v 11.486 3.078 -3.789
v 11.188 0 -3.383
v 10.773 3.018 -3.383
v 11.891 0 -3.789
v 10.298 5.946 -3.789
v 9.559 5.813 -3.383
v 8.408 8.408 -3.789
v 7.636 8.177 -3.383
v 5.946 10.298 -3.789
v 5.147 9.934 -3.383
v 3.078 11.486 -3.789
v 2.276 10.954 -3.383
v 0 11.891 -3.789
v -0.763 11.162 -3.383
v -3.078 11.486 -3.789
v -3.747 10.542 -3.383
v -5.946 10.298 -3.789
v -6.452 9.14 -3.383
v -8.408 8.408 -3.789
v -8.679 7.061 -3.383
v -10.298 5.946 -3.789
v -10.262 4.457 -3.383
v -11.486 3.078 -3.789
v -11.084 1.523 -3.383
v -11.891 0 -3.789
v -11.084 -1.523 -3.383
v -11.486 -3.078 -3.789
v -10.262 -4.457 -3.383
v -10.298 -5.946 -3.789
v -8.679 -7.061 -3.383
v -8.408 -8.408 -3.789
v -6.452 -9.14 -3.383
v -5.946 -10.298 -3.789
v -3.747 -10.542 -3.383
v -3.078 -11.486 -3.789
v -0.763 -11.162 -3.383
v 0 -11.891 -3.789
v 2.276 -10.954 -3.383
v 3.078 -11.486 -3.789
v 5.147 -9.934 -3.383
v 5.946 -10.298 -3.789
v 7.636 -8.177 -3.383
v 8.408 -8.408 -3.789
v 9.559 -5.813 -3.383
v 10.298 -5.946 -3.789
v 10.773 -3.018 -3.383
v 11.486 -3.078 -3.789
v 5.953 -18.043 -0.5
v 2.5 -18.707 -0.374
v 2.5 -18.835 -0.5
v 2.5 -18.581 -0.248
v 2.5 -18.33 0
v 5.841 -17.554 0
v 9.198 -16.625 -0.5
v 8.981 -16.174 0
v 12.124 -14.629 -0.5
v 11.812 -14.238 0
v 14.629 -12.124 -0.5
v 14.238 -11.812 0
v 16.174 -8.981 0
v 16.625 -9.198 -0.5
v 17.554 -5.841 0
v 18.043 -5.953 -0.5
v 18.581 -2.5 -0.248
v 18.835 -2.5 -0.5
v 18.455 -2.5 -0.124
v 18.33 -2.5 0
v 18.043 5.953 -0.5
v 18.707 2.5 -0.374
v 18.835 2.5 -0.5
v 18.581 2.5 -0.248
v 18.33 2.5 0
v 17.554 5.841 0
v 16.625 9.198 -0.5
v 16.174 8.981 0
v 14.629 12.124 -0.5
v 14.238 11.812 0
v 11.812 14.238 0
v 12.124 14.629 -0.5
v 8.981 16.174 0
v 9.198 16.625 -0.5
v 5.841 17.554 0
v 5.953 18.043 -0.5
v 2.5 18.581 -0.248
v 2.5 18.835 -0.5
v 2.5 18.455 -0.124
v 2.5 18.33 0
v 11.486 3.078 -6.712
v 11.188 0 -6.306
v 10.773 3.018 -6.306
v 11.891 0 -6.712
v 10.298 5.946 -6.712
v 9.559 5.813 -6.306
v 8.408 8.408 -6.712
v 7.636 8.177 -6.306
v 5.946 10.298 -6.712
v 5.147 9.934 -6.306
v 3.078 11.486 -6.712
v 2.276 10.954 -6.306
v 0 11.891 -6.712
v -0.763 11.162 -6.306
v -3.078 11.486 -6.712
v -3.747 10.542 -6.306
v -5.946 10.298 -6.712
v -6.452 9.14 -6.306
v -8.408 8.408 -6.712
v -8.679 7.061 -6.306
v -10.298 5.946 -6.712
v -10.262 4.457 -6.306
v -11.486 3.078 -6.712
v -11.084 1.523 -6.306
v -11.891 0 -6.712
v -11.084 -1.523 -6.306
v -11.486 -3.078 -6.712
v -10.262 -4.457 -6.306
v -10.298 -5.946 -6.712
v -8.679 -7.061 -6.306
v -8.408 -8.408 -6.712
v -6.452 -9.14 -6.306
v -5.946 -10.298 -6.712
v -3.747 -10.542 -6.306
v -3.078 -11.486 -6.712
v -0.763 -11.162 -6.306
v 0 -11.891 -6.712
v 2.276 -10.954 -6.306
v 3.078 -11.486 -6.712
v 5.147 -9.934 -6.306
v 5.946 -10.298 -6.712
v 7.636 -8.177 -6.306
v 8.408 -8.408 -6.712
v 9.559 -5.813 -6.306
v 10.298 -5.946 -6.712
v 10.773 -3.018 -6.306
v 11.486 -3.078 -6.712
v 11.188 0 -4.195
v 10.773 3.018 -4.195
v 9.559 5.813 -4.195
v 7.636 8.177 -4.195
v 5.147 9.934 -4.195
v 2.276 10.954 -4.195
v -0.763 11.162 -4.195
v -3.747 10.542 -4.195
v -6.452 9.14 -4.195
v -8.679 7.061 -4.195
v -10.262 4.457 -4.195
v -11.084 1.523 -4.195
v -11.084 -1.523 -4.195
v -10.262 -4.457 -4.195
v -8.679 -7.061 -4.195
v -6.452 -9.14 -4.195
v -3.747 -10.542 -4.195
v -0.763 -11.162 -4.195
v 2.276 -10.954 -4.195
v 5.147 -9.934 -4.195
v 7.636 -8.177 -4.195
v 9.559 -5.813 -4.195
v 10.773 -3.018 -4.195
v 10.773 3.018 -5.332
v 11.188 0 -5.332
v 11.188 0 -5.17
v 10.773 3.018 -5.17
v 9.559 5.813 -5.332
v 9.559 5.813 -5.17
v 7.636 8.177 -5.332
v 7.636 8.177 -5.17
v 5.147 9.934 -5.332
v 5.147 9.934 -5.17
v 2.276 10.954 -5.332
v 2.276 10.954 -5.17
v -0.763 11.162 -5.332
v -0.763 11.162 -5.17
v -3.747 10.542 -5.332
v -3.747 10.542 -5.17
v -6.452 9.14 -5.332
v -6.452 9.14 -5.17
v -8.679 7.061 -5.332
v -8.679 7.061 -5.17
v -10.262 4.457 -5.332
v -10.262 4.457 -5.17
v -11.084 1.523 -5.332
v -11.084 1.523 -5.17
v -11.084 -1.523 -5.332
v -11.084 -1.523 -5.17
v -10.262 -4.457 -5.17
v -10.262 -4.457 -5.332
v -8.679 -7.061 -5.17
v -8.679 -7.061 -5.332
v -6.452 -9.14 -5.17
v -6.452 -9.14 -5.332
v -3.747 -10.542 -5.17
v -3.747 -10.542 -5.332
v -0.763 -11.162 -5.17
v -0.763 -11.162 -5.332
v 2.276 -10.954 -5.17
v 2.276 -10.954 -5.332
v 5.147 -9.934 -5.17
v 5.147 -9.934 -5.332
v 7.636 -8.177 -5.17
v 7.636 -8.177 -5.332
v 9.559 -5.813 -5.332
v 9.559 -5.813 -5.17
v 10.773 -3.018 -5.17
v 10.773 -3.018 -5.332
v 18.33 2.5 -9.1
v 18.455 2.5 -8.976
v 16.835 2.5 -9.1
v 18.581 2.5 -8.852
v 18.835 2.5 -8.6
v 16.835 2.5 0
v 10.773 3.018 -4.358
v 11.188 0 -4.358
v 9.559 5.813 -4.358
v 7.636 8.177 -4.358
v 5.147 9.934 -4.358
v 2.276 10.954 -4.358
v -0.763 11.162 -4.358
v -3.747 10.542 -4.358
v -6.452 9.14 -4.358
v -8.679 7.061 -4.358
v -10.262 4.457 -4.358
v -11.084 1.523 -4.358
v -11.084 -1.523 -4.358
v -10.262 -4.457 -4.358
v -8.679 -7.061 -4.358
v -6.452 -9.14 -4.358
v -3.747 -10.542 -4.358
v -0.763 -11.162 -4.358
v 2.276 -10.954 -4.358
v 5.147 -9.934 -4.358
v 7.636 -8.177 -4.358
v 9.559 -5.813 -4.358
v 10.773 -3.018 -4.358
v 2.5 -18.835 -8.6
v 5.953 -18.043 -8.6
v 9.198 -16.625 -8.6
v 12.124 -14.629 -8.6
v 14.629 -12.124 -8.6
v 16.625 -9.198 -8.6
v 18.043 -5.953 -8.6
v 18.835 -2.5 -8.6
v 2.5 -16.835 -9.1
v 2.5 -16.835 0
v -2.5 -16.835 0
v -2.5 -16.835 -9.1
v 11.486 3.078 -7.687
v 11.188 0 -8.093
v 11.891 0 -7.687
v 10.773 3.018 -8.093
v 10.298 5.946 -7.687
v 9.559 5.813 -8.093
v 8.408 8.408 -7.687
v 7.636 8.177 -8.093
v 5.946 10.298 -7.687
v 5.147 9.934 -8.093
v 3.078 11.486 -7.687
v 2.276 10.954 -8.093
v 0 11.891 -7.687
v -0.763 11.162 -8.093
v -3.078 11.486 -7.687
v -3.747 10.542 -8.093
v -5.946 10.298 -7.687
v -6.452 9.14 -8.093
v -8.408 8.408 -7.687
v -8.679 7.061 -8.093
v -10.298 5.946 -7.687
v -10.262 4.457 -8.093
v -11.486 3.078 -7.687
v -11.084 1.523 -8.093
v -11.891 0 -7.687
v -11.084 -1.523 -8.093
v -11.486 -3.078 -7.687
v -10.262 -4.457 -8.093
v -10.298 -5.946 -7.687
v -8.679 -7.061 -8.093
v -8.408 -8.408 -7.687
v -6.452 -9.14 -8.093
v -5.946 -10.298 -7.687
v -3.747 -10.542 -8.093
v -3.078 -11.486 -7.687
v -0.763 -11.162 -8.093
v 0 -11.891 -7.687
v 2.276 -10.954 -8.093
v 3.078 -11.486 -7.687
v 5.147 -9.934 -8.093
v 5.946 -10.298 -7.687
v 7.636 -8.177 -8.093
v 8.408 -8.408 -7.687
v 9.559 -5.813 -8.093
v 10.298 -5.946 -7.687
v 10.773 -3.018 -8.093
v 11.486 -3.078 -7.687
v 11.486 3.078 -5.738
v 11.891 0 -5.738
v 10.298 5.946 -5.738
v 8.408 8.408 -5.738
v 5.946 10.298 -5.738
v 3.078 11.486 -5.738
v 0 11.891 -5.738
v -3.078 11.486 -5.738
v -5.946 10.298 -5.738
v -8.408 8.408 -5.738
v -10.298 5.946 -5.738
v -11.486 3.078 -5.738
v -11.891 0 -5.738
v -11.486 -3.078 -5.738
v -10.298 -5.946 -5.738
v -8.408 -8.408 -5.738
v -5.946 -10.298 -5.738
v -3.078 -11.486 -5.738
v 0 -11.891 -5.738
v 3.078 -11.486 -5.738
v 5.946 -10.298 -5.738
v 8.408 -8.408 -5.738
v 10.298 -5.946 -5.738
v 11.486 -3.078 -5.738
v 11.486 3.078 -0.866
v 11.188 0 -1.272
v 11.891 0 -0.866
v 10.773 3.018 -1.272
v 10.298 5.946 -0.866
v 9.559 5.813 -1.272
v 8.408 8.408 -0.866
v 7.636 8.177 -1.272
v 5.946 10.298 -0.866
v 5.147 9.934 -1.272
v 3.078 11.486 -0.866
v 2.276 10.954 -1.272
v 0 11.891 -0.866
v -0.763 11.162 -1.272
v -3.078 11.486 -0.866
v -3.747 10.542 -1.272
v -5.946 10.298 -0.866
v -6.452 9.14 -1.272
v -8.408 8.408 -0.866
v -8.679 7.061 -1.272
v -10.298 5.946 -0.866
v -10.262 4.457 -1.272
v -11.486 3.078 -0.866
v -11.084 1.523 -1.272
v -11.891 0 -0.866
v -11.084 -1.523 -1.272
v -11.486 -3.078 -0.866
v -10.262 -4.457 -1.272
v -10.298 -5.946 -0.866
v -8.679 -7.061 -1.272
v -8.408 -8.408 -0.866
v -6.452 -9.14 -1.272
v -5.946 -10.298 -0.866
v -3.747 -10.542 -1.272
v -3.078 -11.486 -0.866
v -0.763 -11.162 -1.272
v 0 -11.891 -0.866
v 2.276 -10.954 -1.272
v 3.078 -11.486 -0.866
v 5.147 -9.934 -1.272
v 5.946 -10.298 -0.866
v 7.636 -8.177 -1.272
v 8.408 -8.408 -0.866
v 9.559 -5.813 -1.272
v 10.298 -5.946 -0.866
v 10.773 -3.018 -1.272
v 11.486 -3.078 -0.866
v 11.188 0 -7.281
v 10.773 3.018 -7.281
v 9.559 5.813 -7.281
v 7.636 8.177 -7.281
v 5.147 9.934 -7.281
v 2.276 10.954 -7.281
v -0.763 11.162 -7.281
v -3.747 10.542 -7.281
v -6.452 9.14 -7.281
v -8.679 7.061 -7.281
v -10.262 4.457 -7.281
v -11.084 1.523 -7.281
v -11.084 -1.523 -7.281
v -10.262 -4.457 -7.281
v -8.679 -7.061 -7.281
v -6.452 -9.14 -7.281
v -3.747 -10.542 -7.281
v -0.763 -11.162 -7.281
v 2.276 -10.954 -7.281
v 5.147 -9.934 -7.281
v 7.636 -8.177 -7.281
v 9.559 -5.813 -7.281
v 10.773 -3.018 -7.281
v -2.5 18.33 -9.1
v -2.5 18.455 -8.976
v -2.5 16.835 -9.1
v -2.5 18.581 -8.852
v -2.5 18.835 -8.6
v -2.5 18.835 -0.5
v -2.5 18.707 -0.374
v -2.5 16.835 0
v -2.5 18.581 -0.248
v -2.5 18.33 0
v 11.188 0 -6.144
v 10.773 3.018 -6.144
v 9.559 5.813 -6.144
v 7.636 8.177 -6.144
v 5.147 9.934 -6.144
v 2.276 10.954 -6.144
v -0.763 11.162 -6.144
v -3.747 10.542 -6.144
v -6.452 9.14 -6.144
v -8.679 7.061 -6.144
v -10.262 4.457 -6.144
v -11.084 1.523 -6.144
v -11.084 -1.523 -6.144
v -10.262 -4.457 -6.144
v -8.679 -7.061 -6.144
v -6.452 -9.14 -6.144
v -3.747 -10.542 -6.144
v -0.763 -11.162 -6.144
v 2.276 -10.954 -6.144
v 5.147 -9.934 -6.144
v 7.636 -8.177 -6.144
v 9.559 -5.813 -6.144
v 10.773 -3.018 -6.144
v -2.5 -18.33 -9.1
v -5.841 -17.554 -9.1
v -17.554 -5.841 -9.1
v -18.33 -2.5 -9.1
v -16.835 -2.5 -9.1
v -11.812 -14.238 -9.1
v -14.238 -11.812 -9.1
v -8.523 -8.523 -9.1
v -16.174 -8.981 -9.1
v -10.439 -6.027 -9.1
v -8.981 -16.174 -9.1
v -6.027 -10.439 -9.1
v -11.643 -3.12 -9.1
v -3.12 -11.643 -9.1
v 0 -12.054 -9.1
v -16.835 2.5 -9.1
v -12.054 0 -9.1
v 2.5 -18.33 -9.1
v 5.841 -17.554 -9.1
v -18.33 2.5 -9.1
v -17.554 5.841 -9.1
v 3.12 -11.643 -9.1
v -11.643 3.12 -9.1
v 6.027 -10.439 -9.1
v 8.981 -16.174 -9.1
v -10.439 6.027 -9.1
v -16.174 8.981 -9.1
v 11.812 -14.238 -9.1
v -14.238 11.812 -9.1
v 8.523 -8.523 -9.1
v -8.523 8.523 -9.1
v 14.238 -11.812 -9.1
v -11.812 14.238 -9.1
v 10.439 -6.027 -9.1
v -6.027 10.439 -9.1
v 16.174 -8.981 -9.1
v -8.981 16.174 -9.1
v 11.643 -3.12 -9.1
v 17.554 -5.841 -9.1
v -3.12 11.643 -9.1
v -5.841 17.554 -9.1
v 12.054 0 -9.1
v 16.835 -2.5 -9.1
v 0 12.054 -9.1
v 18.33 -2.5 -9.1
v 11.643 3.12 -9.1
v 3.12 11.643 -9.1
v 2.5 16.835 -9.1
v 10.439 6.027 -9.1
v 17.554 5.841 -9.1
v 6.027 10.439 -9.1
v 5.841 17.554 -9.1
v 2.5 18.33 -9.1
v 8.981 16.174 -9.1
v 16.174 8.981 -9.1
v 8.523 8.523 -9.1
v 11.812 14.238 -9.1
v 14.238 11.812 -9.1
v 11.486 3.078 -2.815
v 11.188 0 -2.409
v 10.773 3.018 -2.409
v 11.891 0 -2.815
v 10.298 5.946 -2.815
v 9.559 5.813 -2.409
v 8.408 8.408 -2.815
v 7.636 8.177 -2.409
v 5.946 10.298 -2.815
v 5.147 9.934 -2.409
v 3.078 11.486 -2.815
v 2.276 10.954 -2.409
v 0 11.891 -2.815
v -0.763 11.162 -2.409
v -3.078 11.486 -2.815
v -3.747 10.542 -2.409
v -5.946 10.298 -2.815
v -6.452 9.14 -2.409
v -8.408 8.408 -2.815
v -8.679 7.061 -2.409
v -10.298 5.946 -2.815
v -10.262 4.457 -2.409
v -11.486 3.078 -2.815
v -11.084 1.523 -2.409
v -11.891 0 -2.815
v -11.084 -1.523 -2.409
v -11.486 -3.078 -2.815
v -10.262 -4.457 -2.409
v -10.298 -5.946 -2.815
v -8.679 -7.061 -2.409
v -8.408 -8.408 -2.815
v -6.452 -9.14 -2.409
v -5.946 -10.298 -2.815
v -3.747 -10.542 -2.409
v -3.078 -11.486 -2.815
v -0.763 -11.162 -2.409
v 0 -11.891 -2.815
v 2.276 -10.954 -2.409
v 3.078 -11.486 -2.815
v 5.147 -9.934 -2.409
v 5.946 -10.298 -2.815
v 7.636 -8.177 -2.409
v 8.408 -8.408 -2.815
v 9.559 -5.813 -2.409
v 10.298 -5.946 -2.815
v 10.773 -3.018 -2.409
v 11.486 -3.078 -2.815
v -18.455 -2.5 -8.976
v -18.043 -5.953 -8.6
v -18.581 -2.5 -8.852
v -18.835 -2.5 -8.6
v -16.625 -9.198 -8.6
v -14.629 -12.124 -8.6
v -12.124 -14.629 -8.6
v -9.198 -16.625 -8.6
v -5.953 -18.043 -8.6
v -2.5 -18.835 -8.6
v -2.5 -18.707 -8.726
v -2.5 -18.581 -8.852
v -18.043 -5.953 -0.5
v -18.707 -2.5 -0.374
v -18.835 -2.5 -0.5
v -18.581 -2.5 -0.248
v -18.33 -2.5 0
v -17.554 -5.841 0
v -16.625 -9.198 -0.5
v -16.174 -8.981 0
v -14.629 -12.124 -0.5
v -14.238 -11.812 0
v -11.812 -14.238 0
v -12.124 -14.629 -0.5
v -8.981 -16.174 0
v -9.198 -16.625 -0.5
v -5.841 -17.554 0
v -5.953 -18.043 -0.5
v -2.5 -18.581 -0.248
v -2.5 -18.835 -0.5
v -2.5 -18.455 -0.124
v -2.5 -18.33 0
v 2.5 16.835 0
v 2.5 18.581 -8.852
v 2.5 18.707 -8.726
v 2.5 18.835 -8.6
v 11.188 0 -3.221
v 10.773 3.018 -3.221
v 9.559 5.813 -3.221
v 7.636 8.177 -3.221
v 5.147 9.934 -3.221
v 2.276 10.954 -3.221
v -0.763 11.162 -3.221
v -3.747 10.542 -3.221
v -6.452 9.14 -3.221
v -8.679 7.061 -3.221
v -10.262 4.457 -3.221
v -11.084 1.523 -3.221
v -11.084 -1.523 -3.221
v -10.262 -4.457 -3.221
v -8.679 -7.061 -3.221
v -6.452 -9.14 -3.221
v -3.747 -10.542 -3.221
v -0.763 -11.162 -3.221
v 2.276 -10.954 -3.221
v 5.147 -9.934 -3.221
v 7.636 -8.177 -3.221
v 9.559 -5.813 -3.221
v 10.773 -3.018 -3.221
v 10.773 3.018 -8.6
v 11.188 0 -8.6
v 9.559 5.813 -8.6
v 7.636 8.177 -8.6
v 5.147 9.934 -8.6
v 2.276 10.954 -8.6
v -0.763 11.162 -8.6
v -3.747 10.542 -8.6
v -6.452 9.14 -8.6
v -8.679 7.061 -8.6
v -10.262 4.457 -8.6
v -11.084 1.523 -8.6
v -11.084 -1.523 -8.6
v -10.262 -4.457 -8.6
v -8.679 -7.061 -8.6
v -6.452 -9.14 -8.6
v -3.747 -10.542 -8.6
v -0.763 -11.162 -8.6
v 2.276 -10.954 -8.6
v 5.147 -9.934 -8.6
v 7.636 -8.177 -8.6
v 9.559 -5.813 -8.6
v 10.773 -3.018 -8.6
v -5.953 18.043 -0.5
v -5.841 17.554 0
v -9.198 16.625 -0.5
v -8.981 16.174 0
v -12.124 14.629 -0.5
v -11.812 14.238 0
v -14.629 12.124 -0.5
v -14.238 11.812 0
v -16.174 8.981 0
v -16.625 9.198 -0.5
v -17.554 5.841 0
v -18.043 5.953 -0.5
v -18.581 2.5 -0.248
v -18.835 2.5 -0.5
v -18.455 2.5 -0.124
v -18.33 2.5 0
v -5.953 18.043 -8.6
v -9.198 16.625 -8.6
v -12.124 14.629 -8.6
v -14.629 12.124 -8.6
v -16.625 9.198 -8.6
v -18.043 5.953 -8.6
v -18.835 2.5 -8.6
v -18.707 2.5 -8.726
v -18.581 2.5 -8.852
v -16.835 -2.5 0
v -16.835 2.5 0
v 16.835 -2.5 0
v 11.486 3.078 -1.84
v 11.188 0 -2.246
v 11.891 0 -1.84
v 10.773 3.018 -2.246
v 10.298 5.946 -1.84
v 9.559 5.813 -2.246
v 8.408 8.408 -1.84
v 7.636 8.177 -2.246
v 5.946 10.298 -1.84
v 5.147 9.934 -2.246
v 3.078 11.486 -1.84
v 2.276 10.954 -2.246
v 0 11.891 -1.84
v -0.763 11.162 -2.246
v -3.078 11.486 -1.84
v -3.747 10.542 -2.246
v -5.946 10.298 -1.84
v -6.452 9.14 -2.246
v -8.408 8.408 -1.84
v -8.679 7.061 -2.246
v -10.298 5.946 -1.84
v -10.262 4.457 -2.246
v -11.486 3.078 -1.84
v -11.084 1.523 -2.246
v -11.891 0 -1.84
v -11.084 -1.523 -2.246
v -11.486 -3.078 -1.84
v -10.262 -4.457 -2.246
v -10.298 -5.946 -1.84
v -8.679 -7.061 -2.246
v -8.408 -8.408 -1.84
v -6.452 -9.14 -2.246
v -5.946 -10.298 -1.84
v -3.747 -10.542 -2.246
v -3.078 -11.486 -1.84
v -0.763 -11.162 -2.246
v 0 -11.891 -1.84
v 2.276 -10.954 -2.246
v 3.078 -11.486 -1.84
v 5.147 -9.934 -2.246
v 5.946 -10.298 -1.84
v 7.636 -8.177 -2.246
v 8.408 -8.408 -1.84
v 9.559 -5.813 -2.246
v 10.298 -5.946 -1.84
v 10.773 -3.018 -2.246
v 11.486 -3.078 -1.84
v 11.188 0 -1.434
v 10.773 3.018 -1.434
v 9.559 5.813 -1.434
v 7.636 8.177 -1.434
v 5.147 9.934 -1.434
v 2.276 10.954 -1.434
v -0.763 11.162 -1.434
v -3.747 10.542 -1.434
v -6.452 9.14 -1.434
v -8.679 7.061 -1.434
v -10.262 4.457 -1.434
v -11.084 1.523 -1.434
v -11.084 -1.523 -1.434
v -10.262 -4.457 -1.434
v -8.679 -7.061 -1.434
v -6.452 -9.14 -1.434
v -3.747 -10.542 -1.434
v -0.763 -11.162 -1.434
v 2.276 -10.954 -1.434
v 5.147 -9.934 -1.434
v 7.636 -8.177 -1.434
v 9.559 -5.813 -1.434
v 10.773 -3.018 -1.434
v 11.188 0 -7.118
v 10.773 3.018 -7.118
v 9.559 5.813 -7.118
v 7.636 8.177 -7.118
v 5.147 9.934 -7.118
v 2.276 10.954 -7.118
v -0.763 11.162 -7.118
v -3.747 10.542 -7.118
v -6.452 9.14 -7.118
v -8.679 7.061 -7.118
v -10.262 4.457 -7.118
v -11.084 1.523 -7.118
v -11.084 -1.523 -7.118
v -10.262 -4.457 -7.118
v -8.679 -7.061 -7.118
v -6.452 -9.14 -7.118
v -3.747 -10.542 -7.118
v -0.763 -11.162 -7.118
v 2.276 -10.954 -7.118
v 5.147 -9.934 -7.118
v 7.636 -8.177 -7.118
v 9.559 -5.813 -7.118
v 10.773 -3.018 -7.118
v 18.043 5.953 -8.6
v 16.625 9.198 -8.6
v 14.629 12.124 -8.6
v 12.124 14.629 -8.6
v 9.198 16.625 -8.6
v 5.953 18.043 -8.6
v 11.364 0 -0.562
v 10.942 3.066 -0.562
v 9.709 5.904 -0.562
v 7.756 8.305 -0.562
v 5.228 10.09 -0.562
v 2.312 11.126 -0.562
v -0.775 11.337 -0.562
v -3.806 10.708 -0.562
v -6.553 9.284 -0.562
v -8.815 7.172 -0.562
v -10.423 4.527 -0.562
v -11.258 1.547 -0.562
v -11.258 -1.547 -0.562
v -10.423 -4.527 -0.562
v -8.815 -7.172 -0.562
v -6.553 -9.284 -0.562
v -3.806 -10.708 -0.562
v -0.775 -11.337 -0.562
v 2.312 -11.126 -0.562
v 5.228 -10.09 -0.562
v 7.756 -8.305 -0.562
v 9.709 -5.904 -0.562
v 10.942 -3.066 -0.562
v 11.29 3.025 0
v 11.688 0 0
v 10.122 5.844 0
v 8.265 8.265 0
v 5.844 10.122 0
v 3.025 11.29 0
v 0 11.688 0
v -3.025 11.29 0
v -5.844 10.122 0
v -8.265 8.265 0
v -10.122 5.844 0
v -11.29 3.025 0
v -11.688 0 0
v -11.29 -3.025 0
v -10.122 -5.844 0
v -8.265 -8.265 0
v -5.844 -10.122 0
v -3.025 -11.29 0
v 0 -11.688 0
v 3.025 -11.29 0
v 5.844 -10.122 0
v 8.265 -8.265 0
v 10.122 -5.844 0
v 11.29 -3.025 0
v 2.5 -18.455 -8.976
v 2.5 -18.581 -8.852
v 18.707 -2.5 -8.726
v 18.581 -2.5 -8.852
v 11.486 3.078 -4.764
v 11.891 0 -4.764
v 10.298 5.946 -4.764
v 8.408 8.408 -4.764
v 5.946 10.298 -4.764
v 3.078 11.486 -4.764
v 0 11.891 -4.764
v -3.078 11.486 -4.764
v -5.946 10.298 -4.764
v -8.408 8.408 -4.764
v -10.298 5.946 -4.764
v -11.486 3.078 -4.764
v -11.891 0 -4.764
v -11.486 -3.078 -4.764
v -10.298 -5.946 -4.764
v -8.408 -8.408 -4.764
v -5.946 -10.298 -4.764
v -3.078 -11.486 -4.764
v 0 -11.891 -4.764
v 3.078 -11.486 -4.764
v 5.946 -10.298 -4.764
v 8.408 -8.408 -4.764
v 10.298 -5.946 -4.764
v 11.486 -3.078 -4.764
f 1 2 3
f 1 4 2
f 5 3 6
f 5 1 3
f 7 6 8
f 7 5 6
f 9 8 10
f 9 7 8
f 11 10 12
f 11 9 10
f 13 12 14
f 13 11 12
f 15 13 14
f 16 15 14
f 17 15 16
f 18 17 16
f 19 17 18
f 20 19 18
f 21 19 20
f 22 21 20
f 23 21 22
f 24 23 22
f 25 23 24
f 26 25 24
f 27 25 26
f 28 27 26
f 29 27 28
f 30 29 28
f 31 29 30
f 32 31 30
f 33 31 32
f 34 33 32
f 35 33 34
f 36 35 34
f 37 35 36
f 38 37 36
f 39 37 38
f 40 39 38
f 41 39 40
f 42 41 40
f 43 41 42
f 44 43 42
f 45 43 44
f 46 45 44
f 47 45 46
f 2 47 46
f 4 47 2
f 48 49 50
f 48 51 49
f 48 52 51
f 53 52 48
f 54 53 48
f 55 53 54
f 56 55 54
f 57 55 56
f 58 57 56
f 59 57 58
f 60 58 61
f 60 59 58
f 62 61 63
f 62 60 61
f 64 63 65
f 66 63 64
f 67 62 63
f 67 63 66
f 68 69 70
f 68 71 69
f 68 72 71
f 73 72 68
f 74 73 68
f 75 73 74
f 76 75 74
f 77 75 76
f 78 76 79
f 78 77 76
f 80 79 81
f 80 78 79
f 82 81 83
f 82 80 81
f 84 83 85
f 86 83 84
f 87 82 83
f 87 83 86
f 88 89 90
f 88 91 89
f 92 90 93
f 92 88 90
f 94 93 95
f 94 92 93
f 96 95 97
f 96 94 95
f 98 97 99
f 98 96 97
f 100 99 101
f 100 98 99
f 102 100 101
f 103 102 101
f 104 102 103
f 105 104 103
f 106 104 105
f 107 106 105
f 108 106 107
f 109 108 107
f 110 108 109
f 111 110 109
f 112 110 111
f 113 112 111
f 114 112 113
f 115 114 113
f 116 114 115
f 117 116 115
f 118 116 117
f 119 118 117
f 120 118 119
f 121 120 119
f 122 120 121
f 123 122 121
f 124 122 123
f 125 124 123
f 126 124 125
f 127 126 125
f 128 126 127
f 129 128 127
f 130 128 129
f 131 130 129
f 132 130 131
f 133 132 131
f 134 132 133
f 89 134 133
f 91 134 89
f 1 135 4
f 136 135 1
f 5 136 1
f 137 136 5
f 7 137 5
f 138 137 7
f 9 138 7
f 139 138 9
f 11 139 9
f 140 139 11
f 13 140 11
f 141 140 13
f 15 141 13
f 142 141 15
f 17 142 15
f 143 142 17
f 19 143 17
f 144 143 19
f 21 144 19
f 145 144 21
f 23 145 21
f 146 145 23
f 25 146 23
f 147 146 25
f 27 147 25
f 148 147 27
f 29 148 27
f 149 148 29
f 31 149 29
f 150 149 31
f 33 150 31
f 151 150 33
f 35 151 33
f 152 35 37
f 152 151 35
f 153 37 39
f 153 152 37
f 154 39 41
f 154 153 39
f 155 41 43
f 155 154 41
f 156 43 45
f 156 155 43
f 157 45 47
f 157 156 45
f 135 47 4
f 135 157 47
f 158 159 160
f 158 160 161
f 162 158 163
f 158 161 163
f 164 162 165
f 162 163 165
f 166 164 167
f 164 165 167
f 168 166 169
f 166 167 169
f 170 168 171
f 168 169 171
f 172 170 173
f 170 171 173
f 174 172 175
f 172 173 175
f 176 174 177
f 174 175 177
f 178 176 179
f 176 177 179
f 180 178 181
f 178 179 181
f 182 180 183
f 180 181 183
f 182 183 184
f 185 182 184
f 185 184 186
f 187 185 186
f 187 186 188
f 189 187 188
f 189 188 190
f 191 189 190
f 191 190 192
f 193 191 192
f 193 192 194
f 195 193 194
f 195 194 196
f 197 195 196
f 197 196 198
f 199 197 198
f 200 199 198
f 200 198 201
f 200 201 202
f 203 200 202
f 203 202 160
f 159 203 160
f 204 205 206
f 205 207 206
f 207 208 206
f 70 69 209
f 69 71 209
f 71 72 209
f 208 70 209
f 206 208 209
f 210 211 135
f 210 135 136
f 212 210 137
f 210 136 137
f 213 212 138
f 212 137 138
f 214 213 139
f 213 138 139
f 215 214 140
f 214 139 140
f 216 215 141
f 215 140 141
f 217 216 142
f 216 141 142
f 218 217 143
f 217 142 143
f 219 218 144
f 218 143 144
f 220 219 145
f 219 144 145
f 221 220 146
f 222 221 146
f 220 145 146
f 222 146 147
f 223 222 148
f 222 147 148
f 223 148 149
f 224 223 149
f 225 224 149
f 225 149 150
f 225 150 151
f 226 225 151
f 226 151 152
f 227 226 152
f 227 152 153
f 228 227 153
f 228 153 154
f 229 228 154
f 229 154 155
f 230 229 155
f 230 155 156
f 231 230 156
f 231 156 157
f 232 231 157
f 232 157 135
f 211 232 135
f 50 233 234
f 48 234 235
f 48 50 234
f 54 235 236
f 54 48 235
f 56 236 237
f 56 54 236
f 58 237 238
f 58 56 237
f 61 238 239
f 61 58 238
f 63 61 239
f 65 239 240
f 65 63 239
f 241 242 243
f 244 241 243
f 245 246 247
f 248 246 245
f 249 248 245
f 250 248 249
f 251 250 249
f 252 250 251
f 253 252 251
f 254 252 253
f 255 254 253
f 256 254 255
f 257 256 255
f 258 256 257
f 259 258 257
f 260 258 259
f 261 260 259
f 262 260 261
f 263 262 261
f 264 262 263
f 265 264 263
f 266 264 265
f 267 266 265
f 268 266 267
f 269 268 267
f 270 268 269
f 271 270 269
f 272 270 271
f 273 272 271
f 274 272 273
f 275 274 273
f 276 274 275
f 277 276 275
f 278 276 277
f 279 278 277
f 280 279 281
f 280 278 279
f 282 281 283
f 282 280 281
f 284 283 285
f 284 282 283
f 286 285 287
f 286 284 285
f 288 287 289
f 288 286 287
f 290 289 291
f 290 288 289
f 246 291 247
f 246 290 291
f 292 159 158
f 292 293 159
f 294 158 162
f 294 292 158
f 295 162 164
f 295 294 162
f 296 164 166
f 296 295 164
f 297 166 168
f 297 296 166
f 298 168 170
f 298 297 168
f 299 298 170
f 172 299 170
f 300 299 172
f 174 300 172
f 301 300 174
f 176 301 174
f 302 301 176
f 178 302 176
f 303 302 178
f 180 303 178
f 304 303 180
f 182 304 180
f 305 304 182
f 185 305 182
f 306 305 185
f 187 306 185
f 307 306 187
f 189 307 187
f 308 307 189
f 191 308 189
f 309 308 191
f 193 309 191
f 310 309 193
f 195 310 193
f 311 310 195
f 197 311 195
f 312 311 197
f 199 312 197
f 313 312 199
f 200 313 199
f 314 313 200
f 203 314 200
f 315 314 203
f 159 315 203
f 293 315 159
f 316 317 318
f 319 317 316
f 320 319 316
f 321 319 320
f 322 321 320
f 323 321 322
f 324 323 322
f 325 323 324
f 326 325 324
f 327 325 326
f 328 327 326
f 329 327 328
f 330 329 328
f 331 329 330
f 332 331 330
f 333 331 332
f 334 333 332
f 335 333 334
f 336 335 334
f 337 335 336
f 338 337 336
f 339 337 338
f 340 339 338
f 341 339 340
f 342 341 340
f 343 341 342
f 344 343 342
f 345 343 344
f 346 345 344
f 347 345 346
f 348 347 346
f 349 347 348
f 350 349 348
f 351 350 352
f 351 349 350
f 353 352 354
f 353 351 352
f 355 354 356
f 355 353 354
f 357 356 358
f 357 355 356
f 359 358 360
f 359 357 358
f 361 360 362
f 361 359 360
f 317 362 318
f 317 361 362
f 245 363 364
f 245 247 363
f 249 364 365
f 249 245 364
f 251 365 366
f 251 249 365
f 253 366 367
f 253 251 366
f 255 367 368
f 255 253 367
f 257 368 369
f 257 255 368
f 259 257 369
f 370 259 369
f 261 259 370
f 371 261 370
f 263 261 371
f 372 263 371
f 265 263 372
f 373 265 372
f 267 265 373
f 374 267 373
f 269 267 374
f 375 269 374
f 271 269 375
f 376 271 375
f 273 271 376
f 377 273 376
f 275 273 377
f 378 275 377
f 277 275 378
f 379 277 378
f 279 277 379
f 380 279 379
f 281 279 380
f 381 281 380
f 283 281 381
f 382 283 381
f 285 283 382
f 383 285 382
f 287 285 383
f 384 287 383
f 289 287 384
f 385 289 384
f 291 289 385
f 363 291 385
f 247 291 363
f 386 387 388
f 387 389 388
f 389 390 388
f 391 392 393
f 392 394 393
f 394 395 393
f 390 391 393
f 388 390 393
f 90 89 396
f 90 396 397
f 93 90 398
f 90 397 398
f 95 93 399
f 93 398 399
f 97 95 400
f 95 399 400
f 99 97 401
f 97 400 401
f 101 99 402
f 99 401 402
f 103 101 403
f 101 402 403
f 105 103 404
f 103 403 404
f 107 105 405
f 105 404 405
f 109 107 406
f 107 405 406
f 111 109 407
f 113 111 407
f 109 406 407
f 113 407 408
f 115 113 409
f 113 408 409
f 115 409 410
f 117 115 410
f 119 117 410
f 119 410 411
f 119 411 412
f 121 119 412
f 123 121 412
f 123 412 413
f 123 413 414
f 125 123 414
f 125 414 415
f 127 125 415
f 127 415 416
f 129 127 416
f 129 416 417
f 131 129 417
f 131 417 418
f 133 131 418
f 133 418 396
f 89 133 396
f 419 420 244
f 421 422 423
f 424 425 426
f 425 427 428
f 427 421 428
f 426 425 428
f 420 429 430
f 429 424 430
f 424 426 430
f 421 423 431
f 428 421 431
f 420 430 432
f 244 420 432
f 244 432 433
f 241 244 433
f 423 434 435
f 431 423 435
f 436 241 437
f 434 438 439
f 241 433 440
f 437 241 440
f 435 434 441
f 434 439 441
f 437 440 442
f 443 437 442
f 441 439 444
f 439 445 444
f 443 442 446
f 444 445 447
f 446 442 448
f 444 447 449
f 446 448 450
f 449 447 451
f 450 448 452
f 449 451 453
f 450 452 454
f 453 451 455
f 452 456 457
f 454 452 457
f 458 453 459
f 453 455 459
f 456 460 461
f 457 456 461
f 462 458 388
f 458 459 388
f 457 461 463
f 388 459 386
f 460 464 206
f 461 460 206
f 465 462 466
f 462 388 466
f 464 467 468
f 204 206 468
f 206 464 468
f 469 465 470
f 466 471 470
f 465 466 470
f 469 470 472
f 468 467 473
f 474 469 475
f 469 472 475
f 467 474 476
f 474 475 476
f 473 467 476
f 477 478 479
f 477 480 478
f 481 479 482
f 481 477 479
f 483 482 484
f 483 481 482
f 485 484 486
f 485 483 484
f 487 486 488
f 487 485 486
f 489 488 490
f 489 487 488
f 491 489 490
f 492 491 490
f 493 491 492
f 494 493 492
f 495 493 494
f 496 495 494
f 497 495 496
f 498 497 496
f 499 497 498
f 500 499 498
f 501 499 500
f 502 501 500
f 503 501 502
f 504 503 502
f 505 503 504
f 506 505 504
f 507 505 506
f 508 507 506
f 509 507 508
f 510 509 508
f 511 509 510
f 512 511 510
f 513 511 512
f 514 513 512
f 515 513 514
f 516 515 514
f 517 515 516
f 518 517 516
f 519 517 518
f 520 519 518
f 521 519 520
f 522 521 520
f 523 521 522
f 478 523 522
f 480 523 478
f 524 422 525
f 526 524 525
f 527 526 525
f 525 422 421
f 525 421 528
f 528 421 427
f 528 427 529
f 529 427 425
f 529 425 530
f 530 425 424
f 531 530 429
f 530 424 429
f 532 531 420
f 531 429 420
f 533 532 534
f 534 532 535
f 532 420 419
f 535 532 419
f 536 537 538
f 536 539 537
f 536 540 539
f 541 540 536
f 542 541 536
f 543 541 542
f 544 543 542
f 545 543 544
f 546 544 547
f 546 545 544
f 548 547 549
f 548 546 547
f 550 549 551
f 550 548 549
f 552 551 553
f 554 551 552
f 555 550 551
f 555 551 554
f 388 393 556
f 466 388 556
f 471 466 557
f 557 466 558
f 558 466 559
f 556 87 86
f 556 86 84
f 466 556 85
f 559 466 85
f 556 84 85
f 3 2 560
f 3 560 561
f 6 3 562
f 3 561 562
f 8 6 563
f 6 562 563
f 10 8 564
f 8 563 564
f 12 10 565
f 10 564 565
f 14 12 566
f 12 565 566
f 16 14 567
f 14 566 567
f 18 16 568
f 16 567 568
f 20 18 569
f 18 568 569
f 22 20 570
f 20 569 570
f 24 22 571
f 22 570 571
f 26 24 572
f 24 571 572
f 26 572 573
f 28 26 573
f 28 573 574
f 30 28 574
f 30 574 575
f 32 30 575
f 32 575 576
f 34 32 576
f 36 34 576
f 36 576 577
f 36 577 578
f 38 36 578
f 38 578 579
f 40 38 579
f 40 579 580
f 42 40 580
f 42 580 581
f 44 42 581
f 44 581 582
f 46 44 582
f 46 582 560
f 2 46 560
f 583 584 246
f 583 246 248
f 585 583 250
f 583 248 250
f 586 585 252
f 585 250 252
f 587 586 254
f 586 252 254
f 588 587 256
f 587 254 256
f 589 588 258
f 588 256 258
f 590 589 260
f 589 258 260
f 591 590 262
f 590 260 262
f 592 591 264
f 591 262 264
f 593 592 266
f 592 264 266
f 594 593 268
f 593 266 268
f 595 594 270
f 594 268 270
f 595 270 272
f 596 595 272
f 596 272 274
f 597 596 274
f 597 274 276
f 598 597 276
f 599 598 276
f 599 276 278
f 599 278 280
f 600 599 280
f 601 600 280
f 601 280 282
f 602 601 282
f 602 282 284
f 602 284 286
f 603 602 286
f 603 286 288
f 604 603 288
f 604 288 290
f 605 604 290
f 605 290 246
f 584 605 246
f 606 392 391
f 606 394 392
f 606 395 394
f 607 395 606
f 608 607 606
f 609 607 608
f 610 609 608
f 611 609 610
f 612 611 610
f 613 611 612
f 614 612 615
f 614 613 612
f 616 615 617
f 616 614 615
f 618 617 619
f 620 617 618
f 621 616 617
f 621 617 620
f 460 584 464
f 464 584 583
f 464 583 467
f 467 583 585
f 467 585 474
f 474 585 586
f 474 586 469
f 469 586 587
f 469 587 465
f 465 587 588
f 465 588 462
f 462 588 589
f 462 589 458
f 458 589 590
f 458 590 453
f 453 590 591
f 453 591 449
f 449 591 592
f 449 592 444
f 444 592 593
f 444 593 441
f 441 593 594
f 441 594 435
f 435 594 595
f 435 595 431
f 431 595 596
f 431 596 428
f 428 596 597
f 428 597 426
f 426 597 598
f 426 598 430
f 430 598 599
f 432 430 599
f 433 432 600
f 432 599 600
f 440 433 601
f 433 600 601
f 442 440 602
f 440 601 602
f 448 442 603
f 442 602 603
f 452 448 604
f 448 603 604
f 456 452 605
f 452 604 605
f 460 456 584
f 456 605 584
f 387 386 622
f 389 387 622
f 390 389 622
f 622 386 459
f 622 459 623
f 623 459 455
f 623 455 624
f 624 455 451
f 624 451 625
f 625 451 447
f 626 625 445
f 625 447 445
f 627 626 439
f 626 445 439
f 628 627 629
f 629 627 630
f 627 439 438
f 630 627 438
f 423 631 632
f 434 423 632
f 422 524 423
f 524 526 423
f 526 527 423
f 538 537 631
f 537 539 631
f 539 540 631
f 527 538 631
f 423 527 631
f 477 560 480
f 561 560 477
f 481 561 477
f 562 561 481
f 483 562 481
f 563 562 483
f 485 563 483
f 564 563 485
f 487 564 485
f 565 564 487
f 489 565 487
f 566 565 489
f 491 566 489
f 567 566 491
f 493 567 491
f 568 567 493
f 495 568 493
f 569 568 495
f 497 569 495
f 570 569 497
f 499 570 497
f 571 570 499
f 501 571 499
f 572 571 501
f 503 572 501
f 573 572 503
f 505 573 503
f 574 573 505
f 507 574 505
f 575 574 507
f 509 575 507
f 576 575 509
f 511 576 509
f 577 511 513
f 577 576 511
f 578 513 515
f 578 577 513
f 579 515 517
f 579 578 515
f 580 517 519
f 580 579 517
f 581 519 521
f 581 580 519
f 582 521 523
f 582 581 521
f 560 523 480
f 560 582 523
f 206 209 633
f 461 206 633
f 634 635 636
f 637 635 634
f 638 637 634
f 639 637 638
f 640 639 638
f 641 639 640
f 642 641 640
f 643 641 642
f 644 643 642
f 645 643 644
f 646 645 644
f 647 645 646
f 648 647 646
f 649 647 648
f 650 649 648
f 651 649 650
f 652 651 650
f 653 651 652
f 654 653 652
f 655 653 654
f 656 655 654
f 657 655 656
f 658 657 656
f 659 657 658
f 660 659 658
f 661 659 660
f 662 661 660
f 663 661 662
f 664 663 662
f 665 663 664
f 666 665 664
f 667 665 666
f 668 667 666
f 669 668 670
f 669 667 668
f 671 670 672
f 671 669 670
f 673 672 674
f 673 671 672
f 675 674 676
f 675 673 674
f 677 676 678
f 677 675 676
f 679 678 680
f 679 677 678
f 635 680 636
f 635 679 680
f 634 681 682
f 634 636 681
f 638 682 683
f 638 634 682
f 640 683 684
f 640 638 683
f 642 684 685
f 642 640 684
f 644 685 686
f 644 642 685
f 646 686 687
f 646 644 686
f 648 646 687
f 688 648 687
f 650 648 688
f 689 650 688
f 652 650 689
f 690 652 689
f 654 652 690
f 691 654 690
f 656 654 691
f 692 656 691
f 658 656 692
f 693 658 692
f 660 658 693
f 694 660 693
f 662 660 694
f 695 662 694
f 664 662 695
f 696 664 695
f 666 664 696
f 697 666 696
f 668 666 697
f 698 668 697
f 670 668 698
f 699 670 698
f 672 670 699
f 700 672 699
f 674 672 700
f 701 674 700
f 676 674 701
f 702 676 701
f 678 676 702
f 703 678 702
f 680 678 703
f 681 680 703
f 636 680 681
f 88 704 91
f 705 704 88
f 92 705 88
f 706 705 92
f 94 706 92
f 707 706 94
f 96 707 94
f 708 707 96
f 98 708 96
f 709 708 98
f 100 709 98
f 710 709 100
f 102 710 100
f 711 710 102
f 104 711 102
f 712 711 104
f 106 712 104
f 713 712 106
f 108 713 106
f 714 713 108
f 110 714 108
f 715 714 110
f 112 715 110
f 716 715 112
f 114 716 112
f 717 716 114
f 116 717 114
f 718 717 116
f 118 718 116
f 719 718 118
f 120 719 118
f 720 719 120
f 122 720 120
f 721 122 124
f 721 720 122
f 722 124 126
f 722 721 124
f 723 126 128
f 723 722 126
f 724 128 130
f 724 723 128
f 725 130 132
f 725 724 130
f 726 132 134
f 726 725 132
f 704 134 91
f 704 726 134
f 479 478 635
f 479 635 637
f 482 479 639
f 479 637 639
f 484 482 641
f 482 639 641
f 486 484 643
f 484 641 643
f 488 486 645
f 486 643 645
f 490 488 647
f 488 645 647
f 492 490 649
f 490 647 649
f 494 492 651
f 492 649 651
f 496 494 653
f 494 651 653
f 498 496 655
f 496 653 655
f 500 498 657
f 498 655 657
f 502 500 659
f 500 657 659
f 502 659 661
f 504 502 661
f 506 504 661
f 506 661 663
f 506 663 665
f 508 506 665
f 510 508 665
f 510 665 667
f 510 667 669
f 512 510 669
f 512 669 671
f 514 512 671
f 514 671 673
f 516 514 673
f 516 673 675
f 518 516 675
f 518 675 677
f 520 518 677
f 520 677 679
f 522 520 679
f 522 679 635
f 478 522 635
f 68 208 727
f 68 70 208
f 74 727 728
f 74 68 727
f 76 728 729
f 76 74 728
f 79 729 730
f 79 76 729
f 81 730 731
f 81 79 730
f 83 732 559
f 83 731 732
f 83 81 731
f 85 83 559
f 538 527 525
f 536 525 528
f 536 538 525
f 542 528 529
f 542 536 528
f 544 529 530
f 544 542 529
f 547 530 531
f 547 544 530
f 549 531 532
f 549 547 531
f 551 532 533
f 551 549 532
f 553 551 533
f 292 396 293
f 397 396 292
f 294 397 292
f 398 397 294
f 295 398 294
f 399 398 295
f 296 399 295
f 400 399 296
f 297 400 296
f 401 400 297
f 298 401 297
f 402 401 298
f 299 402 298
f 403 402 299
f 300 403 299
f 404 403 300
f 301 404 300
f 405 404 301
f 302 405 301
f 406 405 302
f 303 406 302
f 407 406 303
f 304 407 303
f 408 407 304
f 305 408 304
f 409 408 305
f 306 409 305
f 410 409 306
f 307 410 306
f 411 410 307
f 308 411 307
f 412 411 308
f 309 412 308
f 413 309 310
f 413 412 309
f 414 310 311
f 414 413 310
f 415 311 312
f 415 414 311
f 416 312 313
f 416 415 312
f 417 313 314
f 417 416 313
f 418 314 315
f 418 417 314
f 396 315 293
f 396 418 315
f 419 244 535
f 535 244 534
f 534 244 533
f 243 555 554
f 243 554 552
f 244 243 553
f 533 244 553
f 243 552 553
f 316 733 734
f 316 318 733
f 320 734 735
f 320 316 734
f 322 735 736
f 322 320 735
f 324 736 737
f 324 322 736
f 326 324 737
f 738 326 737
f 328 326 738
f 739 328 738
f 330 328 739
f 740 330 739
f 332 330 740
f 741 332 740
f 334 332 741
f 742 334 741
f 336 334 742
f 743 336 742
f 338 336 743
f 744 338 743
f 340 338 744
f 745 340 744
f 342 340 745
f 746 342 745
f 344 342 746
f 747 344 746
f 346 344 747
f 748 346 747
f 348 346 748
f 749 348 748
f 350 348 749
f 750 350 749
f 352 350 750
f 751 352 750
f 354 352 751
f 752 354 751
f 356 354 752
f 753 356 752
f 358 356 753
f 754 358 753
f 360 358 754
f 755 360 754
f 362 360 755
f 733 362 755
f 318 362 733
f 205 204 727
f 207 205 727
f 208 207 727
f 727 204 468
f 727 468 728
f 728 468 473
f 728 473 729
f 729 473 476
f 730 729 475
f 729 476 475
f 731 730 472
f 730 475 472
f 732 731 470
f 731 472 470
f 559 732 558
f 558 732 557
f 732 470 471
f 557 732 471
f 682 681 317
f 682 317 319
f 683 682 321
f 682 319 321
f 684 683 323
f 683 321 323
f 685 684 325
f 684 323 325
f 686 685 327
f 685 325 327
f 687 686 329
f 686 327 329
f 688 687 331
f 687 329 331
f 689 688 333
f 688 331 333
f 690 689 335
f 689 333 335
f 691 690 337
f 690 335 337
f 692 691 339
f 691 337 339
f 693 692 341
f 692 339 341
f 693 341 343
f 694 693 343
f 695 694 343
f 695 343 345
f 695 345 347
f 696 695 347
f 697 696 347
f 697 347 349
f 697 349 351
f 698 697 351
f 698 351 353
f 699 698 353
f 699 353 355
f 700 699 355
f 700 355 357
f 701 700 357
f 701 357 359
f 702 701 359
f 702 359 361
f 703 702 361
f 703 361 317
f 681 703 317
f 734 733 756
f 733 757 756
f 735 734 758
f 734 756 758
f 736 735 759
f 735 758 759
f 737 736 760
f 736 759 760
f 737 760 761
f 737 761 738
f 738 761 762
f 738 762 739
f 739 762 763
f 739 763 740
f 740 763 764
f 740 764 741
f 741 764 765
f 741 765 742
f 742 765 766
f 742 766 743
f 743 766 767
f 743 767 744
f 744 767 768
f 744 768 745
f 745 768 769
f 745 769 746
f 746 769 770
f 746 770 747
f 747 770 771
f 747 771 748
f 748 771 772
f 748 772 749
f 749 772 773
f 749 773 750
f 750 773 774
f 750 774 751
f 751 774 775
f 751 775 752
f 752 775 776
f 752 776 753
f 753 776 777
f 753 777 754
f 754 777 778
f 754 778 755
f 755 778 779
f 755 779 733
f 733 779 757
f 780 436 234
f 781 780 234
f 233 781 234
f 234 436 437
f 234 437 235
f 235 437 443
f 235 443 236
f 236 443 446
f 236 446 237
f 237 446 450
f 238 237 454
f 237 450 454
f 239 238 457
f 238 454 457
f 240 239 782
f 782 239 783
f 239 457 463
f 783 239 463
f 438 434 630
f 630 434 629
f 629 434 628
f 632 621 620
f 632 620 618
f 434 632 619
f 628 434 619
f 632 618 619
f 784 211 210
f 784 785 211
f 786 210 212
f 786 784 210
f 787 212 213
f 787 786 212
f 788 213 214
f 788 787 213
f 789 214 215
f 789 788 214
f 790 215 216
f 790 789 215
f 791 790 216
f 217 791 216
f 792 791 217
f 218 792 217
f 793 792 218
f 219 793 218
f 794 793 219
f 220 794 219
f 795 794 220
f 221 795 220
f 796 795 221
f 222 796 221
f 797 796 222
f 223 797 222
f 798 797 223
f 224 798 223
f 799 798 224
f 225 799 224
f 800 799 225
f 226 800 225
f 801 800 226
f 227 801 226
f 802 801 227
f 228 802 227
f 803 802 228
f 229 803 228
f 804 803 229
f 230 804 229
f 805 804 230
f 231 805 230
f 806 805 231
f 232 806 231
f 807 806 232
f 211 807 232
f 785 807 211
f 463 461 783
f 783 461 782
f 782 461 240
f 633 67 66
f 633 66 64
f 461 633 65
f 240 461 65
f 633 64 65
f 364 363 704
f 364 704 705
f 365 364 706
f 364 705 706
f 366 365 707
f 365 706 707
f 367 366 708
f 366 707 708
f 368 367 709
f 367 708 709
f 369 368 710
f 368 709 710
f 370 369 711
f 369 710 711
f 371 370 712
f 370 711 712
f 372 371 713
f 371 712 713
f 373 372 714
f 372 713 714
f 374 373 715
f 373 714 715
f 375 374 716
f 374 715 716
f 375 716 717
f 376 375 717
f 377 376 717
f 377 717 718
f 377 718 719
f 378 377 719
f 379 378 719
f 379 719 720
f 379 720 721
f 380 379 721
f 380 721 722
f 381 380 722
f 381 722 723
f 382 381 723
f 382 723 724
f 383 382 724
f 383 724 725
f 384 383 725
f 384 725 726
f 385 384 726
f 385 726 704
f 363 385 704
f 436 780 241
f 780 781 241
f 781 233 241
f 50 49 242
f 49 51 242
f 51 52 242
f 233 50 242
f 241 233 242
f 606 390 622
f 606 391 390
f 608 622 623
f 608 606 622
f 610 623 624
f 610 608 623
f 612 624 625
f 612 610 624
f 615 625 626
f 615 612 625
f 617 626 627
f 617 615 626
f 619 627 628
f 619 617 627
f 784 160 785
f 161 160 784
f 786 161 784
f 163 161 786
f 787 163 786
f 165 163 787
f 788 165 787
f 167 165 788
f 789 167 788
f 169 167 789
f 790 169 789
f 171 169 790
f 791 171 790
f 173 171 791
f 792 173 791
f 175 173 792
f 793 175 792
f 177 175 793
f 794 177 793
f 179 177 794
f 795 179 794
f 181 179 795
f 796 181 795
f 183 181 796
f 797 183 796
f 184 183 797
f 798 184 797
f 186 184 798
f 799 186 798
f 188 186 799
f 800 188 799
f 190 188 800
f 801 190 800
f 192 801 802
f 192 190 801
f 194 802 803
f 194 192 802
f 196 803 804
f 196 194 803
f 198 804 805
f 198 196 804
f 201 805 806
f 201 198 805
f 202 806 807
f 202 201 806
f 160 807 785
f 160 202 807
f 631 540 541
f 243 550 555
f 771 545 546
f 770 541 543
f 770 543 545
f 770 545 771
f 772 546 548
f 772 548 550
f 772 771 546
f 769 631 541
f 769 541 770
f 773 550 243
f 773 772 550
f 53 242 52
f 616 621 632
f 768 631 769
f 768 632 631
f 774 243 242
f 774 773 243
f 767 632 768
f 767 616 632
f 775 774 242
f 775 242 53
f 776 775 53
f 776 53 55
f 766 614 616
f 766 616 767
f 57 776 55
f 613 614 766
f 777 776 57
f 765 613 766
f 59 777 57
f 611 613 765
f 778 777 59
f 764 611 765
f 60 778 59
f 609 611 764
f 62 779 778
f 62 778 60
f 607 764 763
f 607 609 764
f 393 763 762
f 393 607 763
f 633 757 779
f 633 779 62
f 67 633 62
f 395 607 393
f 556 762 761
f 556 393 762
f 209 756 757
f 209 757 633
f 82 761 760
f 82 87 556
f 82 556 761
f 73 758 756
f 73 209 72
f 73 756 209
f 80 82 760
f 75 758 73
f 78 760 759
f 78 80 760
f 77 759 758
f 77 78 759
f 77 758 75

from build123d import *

# Parameters (mm, degrees)
SKETCH2_R               = 19
BASENUT_DEPTH           = 9.1
CHAMFER1_SIZE           = 0.5
SKETCH3_R               = 11.188
HOLE_DEPTH              = 10.1
ENDCHAMFER_SIZE2        = 0.5
ENDCHAMFER_SIZE         = 0.866025404
ENDCHAMFER_EDGE_2_SIZE2 = 0.5
ENDCHAMFER_EDGE_2_SIZE  = 0.866025404
SLOTCUT_DEPTH           = 10.1
SLOTPAT_COUNT           = 4
LPATTERN10_COUNT        = 8
LPATTERN10_PITCH        = 0.9744


with BuildPart() as part:
    # Sketch2 → BaseNut (new body)
    with BuildSketch(Plane.XY):
        Circle(SKETCH2_R)
    extrude(amount=-BASENUT_DEPTH)

    # Chamfer1
    chamfer1_edges = [part.edges().sort_by_distance(p)[0] for p in [
        (-19, 0, 0),
        (-19, 0, -9.1),
    ]]
    chamfer(chamfer1_edges, length=CHAMFER1_SIZE)

    # Sketch3 → Hole (cut, through all)
    with BuildSketch(Plane(origin=(-17.561722019, 31.682666601, 0), x_dir=(1, 0, 0), z_dir=(0, 0, 1))):
        with Locations((17.561722019, -31.682666601)):
            Circle(SKETCH3_R)
    extrude(amount=-HOLE_DEPTH, mode=Mode.SUBTRACT)

    # EndChamfer
    endchamfer_edges = [part.edges().sort_by_distance(p)[0] for p in [
        (-11.188, 0, -9.1),
    ]]
    chamfer(endchamfer_edges, length=ENDCHAMFER_SIZE, length2=ENDCHAMFER_SIZE2)

    # EndChamfer edge 2
    endchamfer_edge_2_edges = [part.edges().sort_by_distance(p)[0] for p in [
        (-11.188, 0, 0),
    ]]
    chamfer(endchamfer_edge_2_edges, length=ENDCHAMFER_EDGE_2_SIZE, length2=ENDCHAMFER_EDGE_2_SIZE2)

    # Sketch4 → SlotCut (cut, through all)
    with BuildSketch(Plane(origin=(-28.84840977, 49.266341409, 0), x_dir=(1, 0, 0), z_dir=(0, 0, 1))):
        with BuildLine():
            Line((26.34840977, -30.431533207), (26.34840977, -32.431533207))
            Line((26.34840977, -32.431533207), (31.34840977, -32.431533207))
            Line((31.34840977, -32.431533207), (31.34840977, -30.431533207))
            ThreePointArc((31.34840977, -30.431533207), (28.84840977, -30.266341409), (26.34840977, -30.431533207))
        make_face()
    slotcut = extrude(amount=-SLOTCUT_DEPTH, mode=Mode.SUBTRACT)

    # SlotPat: SlotCut ×4 about axis
    slotpat_axis = Axis((0, 0, 0), (0, 0, 1))
    for i in range(1, SLOTPAT_COUNT):
        add(slotcut.rotate(slotpat_axis, i * 360 / SLOTPAT_COUNT), mode=Mode.SUBTRACT)

    # Sketch5 → Cut-Revolve10 (revolve, cut)
    with BuildSketch(Plane(origin=(0, 0, 0), x_dir=(1, 0, 0), z_dir=(0, 1, 0))):
        Polygon((10.376, 1.272025404), (10.376, 0.460025404), (11.188, 0.460025404), (11.891212628, 0.866025404), (11.188, 1.272025404), align=None)
    cut_revolve10 = revolve(axis=Axis((0, 0, -37.301805437), (0, 0, 1)), mode=Mode.SUBTRACT)

    # LPattern10: Cut-Revolve10 ×8
    with Locations(*[(0, 0, -i * LPATTERN10_PITCH) for i in range(1, LPATTERN10_COUNT)]):
        add(cut_revolve10, mode=Mode.SUBTRACT)


solid = part.part
